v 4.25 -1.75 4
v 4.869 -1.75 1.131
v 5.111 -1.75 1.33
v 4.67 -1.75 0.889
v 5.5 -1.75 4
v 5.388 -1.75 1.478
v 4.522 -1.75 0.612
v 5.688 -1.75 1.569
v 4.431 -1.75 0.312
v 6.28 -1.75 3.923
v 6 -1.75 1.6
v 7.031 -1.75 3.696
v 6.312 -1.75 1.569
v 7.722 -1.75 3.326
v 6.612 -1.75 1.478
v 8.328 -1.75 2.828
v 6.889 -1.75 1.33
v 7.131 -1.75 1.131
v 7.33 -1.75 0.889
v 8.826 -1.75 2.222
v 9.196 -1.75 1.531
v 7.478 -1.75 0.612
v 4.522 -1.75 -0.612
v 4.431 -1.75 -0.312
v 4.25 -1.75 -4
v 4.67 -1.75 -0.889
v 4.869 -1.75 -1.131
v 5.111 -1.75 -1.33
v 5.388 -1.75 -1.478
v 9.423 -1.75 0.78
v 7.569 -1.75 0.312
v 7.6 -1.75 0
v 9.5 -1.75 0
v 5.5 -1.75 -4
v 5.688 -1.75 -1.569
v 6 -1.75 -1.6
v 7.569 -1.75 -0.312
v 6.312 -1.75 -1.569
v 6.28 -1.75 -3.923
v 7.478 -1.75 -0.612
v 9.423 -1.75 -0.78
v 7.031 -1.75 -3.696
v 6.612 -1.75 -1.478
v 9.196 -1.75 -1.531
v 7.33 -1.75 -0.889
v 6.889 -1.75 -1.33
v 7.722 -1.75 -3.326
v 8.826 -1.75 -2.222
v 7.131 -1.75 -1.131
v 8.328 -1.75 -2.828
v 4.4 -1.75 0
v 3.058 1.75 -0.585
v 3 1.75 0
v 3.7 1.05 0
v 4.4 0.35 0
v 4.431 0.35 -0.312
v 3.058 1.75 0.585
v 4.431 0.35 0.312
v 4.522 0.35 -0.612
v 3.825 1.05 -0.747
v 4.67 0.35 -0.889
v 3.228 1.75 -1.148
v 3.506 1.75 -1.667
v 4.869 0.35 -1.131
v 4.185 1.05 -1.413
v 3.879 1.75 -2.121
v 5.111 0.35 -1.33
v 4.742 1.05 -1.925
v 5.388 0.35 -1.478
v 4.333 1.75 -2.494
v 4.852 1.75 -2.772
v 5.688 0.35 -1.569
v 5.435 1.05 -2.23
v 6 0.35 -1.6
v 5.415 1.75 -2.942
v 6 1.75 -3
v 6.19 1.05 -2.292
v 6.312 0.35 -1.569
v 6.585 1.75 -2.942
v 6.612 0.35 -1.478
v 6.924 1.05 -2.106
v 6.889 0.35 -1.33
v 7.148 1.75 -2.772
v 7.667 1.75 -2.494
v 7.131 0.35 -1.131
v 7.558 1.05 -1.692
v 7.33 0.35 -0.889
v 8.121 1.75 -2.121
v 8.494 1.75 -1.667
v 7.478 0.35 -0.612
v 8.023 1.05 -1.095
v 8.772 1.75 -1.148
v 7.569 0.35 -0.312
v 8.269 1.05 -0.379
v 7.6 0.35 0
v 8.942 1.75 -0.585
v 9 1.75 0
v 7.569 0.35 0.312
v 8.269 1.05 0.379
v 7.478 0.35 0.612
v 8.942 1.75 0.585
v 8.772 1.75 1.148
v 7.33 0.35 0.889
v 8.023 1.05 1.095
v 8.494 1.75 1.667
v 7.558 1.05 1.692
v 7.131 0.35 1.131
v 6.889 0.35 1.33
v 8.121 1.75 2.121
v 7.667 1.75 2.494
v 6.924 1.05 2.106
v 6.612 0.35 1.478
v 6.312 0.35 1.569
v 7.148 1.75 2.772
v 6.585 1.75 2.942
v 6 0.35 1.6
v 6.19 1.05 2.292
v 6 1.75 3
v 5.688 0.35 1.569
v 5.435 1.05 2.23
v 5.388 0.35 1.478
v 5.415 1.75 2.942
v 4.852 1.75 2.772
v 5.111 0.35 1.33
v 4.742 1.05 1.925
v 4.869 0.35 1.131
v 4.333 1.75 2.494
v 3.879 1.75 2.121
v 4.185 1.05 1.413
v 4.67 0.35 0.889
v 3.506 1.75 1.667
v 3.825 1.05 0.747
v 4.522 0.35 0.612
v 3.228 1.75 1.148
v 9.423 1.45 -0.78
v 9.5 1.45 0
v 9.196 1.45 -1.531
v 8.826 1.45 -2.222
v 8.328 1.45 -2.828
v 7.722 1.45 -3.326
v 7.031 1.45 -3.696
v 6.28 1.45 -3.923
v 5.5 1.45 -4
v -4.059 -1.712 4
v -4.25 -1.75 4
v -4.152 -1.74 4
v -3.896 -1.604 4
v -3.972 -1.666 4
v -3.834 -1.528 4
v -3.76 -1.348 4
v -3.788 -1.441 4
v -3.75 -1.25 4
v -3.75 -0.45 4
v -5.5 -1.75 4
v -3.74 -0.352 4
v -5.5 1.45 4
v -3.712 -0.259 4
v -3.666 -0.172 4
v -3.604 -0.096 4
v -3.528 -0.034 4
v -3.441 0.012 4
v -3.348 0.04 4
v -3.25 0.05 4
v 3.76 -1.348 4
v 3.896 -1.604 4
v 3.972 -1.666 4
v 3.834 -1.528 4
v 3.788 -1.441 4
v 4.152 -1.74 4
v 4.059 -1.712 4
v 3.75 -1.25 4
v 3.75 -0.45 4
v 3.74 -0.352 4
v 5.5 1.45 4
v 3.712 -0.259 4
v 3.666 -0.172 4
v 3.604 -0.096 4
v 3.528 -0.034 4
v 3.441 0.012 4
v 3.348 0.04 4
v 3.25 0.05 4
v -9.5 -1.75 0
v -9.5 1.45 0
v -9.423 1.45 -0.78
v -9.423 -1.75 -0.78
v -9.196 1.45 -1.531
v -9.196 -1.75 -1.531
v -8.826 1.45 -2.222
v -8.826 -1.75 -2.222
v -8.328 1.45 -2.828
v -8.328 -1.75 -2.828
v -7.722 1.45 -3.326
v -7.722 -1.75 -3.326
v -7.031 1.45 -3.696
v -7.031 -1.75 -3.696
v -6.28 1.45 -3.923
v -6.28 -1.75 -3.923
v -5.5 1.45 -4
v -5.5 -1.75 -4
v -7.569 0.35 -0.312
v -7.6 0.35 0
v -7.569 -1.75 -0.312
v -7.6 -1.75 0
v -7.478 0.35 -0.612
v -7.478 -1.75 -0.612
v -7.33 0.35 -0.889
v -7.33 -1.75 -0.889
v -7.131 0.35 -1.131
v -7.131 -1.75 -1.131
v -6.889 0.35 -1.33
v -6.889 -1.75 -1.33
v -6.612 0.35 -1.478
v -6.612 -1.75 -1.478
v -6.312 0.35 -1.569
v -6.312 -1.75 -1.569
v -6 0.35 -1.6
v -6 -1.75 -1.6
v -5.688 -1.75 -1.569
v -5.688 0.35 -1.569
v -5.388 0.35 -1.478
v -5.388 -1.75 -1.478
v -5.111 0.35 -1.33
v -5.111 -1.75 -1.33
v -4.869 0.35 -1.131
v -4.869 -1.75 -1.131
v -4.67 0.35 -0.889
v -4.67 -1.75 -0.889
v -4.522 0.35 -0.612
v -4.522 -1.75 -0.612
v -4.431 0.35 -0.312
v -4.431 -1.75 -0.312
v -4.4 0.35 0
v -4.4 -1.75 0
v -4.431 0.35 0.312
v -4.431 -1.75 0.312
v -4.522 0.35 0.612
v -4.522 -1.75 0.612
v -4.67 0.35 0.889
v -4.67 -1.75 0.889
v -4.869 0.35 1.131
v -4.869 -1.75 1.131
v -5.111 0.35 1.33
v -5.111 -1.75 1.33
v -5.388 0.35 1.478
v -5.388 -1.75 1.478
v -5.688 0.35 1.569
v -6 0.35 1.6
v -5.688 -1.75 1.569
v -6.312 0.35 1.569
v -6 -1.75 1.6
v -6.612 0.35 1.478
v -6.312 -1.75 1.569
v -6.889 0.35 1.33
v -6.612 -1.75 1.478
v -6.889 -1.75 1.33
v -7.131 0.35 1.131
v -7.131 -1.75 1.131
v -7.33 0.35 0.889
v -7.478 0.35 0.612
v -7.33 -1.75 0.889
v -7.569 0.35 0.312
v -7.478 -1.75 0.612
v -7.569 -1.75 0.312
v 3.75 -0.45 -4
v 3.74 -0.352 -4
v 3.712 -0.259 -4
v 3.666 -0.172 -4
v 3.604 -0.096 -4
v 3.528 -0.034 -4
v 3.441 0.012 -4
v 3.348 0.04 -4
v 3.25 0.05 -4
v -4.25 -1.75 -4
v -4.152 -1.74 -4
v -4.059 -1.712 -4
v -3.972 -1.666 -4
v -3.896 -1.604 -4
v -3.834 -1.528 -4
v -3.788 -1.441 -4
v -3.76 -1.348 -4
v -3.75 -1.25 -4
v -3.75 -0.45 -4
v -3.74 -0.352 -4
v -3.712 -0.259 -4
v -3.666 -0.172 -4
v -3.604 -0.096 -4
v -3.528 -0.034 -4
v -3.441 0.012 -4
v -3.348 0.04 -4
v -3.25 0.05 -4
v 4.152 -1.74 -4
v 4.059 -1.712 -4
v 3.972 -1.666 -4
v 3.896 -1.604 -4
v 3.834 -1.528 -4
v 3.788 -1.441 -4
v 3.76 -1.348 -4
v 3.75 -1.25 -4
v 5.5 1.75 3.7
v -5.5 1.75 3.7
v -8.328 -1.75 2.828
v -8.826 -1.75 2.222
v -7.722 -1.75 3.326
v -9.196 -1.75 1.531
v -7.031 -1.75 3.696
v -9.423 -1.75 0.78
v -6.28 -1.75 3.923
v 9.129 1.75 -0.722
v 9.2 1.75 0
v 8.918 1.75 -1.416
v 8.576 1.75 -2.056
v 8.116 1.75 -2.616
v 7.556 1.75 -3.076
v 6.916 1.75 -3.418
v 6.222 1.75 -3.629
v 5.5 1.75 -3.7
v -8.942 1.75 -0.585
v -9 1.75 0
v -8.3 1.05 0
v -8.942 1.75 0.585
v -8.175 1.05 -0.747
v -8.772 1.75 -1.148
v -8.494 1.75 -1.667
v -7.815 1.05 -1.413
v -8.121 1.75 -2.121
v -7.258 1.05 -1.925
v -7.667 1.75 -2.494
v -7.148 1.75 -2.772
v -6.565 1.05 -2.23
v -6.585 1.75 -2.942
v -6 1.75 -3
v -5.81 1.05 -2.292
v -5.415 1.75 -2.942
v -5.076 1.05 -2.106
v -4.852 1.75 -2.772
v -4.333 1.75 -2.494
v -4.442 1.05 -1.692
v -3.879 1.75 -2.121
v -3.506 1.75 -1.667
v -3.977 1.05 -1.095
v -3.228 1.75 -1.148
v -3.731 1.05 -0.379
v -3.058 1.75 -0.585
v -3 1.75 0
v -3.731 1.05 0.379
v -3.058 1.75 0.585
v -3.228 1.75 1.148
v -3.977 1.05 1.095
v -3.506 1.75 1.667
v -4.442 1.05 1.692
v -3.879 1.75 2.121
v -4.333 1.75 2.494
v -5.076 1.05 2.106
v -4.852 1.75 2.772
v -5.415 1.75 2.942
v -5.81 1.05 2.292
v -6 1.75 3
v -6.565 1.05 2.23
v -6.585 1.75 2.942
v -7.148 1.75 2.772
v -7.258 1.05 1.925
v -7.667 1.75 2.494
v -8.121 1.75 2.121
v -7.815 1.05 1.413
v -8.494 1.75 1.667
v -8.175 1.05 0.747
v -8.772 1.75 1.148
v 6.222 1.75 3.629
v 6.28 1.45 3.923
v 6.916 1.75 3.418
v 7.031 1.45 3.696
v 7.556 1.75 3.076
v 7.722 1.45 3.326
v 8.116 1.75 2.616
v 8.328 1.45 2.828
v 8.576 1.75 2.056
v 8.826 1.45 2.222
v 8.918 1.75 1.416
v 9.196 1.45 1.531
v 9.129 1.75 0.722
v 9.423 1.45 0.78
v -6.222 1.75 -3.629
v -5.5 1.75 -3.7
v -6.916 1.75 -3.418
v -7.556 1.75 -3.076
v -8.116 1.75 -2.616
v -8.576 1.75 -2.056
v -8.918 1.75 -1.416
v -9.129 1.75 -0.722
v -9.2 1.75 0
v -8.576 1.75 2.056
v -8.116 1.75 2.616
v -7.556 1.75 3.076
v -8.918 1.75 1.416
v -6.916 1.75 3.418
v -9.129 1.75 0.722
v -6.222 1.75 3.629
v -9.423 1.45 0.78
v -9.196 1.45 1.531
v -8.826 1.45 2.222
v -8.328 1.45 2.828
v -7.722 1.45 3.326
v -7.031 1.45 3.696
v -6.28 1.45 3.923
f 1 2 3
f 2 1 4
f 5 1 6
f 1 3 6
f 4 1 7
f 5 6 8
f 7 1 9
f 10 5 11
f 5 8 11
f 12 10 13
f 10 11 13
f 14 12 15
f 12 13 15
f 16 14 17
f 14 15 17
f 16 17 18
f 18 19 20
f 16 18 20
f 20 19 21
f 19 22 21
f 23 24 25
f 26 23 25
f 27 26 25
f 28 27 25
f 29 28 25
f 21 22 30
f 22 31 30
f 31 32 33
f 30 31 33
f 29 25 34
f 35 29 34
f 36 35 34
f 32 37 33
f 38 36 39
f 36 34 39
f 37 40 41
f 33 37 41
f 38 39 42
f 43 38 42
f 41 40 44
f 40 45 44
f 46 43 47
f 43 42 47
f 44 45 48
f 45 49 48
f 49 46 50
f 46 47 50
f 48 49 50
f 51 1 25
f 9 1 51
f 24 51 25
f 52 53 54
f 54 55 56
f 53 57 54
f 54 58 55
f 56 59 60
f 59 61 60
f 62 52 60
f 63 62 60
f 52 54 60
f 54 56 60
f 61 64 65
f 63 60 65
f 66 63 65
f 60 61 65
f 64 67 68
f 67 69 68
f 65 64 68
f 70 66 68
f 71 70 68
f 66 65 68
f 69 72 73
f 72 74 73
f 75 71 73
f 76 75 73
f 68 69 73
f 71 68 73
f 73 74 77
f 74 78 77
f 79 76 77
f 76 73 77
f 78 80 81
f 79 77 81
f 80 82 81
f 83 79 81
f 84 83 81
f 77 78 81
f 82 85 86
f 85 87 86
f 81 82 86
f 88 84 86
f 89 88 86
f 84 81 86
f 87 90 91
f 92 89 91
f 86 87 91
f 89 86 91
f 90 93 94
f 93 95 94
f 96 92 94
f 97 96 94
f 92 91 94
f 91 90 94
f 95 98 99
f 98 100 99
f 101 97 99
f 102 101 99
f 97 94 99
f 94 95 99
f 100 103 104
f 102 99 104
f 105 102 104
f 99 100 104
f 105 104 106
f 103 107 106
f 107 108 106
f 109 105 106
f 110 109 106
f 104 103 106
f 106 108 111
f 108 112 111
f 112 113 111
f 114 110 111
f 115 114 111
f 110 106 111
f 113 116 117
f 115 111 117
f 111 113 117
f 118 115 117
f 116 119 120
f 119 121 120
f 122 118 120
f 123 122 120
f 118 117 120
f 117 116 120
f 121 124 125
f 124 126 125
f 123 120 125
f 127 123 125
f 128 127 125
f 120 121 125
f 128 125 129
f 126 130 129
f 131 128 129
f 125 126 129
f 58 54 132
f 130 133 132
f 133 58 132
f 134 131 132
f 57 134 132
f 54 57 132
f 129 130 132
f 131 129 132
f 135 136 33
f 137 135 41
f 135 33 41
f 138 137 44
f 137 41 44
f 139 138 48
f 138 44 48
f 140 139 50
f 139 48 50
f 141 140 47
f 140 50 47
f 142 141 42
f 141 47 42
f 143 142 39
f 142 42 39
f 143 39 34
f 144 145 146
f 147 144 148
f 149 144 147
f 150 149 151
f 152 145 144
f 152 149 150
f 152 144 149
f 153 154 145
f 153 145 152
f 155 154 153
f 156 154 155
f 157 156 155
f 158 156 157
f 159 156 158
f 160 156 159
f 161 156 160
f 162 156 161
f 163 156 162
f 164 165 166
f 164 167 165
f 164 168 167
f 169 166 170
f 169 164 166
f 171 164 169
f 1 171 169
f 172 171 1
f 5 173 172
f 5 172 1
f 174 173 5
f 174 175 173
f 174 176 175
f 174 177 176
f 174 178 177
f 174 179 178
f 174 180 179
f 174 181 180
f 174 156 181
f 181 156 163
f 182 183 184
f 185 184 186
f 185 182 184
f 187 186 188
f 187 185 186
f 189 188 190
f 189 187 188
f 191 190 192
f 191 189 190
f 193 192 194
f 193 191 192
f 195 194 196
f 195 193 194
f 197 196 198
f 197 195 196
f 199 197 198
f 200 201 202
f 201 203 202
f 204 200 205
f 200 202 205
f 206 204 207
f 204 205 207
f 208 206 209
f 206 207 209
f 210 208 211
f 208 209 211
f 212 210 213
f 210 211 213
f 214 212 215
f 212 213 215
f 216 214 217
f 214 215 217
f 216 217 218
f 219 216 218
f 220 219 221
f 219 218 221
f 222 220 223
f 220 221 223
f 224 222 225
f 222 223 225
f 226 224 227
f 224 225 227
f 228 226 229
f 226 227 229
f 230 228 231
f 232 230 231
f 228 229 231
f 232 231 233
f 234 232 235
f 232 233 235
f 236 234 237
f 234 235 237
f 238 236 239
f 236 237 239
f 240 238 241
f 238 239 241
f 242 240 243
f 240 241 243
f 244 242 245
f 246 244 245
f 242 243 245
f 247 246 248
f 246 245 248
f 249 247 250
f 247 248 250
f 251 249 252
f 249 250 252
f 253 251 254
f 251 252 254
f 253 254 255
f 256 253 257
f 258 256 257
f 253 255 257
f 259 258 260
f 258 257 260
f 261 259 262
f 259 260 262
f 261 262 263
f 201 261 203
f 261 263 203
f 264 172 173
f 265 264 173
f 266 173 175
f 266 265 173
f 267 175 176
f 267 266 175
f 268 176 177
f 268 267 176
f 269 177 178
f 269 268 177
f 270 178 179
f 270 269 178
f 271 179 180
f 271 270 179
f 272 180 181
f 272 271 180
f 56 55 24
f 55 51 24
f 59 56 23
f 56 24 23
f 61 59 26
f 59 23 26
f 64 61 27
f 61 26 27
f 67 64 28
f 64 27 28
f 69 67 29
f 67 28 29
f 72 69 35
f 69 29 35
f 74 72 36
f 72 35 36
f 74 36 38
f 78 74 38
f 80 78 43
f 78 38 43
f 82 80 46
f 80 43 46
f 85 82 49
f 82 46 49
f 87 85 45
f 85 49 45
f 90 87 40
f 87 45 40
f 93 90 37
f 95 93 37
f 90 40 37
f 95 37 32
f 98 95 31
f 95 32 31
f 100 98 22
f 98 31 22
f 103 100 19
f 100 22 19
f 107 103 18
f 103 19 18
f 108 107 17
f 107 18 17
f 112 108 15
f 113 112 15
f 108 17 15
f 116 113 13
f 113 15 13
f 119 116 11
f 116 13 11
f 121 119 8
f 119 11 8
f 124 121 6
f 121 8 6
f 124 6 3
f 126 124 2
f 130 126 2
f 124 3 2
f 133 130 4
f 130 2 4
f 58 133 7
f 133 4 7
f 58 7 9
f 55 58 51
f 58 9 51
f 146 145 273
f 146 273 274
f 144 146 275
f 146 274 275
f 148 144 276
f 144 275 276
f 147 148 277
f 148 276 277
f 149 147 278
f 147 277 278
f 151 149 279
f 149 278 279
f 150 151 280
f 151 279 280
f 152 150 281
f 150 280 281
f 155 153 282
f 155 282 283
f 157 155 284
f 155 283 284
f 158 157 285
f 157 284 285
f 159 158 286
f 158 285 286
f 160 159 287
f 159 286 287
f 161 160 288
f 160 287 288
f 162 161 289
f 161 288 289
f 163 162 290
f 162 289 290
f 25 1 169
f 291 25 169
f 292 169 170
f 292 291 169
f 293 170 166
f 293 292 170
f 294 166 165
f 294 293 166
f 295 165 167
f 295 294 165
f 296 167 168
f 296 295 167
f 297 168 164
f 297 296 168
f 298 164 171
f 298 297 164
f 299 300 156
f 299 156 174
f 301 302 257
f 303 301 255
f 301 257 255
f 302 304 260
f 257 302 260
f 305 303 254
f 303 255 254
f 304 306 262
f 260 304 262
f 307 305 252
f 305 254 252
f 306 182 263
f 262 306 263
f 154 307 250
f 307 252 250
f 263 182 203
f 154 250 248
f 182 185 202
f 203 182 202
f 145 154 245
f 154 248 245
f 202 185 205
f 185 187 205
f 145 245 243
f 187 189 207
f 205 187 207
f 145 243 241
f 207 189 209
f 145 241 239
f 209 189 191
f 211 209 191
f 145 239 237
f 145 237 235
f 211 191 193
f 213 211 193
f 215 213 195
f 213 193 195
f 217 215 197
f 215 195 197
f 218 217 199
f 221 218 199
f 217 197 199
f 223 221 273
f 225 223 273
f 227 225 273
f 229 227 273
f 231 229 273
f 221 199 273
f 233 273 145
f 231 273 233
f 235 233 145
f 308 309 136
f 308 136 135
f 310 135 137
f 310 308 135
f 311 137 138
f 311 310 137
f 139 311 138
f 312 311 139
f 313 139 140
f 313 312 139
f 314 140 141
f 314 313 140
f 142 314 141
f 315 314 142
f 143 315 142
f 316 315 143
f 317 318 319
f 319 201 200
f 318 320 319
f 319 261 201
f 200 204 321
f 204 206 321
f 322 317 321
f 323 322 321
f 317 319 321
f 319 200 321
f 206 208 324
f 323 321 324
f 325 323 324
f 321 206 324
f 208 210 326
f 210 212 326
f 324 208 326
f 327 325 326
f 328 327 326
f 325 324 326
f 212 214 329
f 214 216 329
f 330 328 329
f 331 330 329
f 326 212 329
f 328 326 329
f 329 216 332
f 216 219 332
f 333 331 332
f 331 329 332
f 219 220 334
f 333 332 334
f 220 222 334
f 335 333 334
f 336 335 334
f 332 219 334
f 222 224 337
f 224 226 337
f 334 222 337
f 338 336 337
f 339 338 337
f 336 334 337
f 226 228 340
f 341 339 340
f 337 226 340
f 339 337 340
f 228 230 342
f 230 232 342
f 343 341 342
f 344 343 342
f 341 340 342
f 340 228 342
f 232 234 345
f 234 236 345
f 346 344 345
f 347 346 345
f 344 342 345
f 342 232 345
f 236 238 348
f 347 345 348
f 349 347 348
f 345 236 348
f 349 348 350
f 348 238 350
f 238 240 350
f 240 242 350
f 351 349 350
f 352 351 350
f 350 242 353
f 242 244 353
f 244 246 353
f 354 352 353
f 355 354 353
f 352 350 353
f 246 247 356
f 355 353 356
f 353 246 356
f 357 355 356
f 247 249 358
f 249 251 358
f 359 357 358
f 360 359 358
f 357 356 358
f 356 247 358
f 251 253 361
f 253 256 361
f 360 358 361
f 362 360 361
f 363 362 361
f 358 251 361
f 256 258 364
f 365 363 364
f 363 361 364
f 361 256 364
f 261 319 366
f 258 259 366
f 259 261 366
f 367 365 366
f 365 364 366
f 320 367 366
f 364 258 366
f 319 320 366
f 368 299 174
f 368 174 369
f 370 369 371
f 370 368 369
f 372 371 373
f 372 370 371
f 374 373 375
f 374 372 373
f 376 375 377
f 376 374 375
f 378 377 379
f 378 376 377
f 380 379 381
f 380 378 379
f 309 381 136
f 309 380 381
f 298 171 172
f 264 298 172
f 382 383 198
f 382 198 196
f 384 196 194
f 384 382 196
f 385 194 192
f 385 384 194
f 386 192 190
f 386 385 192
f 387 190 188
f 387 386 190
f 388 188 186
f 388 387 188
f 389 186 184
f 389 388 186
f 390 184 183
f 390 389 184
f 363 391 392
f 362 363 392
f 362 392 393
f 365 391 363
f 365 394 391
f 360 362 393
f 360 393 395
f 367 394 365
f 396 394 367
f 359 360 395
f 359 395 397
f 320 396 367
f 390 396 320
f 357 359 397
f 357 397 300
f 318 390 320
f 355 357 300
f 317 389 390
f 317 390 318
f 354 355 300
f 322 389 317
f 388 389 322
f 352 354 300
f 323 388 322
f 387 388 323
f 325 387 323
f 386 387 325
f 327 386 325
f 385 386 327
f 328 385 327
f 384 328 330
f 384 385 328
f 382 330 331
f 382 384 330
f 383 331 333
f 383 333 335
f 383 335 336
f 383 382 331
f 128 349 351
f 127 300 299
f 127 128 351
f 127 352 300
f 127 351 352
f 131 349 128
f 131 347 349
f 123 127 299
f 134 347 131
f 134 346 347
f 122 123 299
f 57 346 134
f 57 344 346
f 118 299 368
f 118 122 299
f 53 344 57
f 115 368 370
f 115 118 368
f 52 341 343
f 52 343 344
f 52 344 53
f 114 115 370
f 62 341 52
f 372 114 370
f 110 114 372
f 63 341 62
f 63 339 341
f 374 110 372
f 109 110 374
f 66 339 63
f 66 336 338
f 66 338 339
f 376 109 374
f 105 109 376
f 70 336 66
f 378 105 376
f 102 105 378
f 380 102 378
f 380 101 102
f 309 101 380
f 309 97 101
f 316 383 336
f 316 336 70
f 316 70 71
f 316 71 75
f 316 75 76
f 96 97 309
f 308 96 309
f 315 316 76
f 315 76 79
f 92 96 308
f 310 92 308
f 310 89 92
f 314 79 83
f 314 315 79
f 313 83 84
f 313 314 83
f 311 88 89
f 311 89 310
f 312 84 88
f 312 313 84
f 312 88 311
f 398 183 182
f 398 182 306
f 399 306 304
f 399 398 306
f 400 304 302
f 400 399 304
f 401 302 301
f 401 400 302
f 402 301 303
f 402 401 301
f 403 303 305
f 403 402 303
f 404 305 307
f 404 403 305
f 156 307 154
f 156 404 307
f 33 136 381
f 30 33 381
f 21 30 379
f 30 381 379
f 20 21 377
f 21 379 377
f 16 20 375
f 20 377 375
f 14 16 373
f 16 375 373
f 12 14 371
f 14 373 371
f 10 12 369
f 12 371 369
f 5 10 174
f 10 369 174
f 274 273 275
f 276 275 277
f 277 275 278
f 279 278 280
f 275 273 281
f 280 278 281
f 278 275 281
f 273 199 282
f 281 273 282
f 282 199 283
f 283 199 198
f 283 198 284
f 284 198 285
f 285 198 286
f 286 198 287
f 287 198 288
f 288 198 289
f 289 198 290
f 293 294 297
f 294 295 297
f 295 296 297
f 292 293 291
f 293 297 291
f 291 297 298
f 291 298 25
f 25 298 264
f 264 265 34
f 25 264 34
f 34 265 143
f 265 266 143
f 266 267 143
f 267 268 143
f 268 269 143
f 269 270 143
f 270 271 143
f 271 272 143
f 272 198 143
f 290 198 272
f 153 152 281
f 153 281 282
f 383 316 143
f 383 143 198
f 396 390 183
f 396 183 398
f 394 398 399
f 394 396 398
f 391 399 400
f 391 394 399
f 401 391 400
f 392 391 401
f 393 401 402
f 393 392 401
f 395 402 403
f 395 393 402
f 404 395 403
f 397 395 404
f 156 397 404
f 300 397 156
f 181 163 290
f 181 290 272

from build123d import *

# Parameters (mm, degrees)
SKETCH_1_W                   = 19
SKETCH_1_H                   = 8
EXTRUDE_1_DEPTH              = 1.75
CUT_EXTRUDE_1_REACH          = 14.542
SKETCH_2_W                   = 7.5
SKETCH_2_H                   = 1.8
HOLE_WIZARD_M3_1_D           = 3.2
HOLE_WIZARD_M3_1_CSINK_D     = 6
HOLE_WIZARD_M3_1_CSINK_ANGLE = 90
FILLET_2_R                   = 4
FILLET_3_R                   = 0.5
CHAMFER_1_SIZE               = 0.3


with BuildPart() as part:
    # 草图1 → 凸台-拉伸1 (new, symmetric)
    with BuildSketch(Plane(origin=(0, 0, 0), x_dir=(1, 0, 0), z_dir=(0, 1, 0))):
        Rectangle(SKETCH_1_W, SKETCH_1_H)
    extrude(amount=EXTRUDE_1_DEPTH, both=True)

    # 草图2 → 切除-拉伸1 (cut, up to next)
    with BuildSketch(Plane.XY.offset(4), mode=Mode.PRIVATE) as cut_extrude_1_sk1:
        with Locations((0, -0.85)):
            Rectangle(SKETCH_2_W, SKETCH_2_H)
    cut_extrude_1_tool1 = extrude(cut_extrude_1_sk1.sketch, amount=-CUT_EXTRUDE_1_REACH, mode=Mode.PRIVATE) & part.part
    add(cut_extrude_1_tool1.solids().sort_by_distance((0, -0.85, 4))[0], mode=Mode.SUBTRACT)

    # M3 十字槽半沉头木螺钉的锥形沉头孔1 (through all)
    with Locations(Plane(origin=(0, 1.75, 0), x_dir=(1, 0, 0), z_dir=(0, 1, 0))):
        with Locations((6, 0), (-6, 0)):
            CounterSinkHole(HOLE_WIZARD_M3_1_D / 2, HOLE_WIZARD_M3_1_CSINK_D / 2, counter_sink_angle=HOLE_WIZARD_M3_1_CSINK_ANGLE)

    # 圆角2
    fillet_2_edges = [part.edges().sort_by_distance(p)[0] for p in [
        (9.5, 0, 4),
        (-9.5, 0, -4),
        (9.5, 0, -4),
        (-9.5, 0, 4),
    ]]
    fillet(fillet_2_edges, radius=FILLET_2_R - 0.0001)  # a hair under: the kernel refuses the full size

    # 圆角3
    fillet_3_edges = [part.edges().sort_by_distance(p)[0] for p in [
        (3.75, 0.05, 0),
        (3.75, -1.75, 0),
        (-3.75, -1.75, 0),
        (-3.75, 0.05, 0),
    ]]
    fillet(fillet_3_edges, radius=FILLET_3_R)

    # 倒角1
    chamfer_1_edges = [part.edges().sort_by_distance(p)[0] for p in [
        (0, 1.75, 4),
        (0, 1.75, -4),
        (-8.328456414, 1.75, 2.828456414),
        (-8.328456414, 1.75, -2.828456414),
        (8.328456414, 1.75, -2.828456414),
        (8.328456414, 1.75, 2.828456414),
    ]]
    chamfer(chamfer_1_edges, length=CHAMFER_1_SIZE)


solid = part.part
